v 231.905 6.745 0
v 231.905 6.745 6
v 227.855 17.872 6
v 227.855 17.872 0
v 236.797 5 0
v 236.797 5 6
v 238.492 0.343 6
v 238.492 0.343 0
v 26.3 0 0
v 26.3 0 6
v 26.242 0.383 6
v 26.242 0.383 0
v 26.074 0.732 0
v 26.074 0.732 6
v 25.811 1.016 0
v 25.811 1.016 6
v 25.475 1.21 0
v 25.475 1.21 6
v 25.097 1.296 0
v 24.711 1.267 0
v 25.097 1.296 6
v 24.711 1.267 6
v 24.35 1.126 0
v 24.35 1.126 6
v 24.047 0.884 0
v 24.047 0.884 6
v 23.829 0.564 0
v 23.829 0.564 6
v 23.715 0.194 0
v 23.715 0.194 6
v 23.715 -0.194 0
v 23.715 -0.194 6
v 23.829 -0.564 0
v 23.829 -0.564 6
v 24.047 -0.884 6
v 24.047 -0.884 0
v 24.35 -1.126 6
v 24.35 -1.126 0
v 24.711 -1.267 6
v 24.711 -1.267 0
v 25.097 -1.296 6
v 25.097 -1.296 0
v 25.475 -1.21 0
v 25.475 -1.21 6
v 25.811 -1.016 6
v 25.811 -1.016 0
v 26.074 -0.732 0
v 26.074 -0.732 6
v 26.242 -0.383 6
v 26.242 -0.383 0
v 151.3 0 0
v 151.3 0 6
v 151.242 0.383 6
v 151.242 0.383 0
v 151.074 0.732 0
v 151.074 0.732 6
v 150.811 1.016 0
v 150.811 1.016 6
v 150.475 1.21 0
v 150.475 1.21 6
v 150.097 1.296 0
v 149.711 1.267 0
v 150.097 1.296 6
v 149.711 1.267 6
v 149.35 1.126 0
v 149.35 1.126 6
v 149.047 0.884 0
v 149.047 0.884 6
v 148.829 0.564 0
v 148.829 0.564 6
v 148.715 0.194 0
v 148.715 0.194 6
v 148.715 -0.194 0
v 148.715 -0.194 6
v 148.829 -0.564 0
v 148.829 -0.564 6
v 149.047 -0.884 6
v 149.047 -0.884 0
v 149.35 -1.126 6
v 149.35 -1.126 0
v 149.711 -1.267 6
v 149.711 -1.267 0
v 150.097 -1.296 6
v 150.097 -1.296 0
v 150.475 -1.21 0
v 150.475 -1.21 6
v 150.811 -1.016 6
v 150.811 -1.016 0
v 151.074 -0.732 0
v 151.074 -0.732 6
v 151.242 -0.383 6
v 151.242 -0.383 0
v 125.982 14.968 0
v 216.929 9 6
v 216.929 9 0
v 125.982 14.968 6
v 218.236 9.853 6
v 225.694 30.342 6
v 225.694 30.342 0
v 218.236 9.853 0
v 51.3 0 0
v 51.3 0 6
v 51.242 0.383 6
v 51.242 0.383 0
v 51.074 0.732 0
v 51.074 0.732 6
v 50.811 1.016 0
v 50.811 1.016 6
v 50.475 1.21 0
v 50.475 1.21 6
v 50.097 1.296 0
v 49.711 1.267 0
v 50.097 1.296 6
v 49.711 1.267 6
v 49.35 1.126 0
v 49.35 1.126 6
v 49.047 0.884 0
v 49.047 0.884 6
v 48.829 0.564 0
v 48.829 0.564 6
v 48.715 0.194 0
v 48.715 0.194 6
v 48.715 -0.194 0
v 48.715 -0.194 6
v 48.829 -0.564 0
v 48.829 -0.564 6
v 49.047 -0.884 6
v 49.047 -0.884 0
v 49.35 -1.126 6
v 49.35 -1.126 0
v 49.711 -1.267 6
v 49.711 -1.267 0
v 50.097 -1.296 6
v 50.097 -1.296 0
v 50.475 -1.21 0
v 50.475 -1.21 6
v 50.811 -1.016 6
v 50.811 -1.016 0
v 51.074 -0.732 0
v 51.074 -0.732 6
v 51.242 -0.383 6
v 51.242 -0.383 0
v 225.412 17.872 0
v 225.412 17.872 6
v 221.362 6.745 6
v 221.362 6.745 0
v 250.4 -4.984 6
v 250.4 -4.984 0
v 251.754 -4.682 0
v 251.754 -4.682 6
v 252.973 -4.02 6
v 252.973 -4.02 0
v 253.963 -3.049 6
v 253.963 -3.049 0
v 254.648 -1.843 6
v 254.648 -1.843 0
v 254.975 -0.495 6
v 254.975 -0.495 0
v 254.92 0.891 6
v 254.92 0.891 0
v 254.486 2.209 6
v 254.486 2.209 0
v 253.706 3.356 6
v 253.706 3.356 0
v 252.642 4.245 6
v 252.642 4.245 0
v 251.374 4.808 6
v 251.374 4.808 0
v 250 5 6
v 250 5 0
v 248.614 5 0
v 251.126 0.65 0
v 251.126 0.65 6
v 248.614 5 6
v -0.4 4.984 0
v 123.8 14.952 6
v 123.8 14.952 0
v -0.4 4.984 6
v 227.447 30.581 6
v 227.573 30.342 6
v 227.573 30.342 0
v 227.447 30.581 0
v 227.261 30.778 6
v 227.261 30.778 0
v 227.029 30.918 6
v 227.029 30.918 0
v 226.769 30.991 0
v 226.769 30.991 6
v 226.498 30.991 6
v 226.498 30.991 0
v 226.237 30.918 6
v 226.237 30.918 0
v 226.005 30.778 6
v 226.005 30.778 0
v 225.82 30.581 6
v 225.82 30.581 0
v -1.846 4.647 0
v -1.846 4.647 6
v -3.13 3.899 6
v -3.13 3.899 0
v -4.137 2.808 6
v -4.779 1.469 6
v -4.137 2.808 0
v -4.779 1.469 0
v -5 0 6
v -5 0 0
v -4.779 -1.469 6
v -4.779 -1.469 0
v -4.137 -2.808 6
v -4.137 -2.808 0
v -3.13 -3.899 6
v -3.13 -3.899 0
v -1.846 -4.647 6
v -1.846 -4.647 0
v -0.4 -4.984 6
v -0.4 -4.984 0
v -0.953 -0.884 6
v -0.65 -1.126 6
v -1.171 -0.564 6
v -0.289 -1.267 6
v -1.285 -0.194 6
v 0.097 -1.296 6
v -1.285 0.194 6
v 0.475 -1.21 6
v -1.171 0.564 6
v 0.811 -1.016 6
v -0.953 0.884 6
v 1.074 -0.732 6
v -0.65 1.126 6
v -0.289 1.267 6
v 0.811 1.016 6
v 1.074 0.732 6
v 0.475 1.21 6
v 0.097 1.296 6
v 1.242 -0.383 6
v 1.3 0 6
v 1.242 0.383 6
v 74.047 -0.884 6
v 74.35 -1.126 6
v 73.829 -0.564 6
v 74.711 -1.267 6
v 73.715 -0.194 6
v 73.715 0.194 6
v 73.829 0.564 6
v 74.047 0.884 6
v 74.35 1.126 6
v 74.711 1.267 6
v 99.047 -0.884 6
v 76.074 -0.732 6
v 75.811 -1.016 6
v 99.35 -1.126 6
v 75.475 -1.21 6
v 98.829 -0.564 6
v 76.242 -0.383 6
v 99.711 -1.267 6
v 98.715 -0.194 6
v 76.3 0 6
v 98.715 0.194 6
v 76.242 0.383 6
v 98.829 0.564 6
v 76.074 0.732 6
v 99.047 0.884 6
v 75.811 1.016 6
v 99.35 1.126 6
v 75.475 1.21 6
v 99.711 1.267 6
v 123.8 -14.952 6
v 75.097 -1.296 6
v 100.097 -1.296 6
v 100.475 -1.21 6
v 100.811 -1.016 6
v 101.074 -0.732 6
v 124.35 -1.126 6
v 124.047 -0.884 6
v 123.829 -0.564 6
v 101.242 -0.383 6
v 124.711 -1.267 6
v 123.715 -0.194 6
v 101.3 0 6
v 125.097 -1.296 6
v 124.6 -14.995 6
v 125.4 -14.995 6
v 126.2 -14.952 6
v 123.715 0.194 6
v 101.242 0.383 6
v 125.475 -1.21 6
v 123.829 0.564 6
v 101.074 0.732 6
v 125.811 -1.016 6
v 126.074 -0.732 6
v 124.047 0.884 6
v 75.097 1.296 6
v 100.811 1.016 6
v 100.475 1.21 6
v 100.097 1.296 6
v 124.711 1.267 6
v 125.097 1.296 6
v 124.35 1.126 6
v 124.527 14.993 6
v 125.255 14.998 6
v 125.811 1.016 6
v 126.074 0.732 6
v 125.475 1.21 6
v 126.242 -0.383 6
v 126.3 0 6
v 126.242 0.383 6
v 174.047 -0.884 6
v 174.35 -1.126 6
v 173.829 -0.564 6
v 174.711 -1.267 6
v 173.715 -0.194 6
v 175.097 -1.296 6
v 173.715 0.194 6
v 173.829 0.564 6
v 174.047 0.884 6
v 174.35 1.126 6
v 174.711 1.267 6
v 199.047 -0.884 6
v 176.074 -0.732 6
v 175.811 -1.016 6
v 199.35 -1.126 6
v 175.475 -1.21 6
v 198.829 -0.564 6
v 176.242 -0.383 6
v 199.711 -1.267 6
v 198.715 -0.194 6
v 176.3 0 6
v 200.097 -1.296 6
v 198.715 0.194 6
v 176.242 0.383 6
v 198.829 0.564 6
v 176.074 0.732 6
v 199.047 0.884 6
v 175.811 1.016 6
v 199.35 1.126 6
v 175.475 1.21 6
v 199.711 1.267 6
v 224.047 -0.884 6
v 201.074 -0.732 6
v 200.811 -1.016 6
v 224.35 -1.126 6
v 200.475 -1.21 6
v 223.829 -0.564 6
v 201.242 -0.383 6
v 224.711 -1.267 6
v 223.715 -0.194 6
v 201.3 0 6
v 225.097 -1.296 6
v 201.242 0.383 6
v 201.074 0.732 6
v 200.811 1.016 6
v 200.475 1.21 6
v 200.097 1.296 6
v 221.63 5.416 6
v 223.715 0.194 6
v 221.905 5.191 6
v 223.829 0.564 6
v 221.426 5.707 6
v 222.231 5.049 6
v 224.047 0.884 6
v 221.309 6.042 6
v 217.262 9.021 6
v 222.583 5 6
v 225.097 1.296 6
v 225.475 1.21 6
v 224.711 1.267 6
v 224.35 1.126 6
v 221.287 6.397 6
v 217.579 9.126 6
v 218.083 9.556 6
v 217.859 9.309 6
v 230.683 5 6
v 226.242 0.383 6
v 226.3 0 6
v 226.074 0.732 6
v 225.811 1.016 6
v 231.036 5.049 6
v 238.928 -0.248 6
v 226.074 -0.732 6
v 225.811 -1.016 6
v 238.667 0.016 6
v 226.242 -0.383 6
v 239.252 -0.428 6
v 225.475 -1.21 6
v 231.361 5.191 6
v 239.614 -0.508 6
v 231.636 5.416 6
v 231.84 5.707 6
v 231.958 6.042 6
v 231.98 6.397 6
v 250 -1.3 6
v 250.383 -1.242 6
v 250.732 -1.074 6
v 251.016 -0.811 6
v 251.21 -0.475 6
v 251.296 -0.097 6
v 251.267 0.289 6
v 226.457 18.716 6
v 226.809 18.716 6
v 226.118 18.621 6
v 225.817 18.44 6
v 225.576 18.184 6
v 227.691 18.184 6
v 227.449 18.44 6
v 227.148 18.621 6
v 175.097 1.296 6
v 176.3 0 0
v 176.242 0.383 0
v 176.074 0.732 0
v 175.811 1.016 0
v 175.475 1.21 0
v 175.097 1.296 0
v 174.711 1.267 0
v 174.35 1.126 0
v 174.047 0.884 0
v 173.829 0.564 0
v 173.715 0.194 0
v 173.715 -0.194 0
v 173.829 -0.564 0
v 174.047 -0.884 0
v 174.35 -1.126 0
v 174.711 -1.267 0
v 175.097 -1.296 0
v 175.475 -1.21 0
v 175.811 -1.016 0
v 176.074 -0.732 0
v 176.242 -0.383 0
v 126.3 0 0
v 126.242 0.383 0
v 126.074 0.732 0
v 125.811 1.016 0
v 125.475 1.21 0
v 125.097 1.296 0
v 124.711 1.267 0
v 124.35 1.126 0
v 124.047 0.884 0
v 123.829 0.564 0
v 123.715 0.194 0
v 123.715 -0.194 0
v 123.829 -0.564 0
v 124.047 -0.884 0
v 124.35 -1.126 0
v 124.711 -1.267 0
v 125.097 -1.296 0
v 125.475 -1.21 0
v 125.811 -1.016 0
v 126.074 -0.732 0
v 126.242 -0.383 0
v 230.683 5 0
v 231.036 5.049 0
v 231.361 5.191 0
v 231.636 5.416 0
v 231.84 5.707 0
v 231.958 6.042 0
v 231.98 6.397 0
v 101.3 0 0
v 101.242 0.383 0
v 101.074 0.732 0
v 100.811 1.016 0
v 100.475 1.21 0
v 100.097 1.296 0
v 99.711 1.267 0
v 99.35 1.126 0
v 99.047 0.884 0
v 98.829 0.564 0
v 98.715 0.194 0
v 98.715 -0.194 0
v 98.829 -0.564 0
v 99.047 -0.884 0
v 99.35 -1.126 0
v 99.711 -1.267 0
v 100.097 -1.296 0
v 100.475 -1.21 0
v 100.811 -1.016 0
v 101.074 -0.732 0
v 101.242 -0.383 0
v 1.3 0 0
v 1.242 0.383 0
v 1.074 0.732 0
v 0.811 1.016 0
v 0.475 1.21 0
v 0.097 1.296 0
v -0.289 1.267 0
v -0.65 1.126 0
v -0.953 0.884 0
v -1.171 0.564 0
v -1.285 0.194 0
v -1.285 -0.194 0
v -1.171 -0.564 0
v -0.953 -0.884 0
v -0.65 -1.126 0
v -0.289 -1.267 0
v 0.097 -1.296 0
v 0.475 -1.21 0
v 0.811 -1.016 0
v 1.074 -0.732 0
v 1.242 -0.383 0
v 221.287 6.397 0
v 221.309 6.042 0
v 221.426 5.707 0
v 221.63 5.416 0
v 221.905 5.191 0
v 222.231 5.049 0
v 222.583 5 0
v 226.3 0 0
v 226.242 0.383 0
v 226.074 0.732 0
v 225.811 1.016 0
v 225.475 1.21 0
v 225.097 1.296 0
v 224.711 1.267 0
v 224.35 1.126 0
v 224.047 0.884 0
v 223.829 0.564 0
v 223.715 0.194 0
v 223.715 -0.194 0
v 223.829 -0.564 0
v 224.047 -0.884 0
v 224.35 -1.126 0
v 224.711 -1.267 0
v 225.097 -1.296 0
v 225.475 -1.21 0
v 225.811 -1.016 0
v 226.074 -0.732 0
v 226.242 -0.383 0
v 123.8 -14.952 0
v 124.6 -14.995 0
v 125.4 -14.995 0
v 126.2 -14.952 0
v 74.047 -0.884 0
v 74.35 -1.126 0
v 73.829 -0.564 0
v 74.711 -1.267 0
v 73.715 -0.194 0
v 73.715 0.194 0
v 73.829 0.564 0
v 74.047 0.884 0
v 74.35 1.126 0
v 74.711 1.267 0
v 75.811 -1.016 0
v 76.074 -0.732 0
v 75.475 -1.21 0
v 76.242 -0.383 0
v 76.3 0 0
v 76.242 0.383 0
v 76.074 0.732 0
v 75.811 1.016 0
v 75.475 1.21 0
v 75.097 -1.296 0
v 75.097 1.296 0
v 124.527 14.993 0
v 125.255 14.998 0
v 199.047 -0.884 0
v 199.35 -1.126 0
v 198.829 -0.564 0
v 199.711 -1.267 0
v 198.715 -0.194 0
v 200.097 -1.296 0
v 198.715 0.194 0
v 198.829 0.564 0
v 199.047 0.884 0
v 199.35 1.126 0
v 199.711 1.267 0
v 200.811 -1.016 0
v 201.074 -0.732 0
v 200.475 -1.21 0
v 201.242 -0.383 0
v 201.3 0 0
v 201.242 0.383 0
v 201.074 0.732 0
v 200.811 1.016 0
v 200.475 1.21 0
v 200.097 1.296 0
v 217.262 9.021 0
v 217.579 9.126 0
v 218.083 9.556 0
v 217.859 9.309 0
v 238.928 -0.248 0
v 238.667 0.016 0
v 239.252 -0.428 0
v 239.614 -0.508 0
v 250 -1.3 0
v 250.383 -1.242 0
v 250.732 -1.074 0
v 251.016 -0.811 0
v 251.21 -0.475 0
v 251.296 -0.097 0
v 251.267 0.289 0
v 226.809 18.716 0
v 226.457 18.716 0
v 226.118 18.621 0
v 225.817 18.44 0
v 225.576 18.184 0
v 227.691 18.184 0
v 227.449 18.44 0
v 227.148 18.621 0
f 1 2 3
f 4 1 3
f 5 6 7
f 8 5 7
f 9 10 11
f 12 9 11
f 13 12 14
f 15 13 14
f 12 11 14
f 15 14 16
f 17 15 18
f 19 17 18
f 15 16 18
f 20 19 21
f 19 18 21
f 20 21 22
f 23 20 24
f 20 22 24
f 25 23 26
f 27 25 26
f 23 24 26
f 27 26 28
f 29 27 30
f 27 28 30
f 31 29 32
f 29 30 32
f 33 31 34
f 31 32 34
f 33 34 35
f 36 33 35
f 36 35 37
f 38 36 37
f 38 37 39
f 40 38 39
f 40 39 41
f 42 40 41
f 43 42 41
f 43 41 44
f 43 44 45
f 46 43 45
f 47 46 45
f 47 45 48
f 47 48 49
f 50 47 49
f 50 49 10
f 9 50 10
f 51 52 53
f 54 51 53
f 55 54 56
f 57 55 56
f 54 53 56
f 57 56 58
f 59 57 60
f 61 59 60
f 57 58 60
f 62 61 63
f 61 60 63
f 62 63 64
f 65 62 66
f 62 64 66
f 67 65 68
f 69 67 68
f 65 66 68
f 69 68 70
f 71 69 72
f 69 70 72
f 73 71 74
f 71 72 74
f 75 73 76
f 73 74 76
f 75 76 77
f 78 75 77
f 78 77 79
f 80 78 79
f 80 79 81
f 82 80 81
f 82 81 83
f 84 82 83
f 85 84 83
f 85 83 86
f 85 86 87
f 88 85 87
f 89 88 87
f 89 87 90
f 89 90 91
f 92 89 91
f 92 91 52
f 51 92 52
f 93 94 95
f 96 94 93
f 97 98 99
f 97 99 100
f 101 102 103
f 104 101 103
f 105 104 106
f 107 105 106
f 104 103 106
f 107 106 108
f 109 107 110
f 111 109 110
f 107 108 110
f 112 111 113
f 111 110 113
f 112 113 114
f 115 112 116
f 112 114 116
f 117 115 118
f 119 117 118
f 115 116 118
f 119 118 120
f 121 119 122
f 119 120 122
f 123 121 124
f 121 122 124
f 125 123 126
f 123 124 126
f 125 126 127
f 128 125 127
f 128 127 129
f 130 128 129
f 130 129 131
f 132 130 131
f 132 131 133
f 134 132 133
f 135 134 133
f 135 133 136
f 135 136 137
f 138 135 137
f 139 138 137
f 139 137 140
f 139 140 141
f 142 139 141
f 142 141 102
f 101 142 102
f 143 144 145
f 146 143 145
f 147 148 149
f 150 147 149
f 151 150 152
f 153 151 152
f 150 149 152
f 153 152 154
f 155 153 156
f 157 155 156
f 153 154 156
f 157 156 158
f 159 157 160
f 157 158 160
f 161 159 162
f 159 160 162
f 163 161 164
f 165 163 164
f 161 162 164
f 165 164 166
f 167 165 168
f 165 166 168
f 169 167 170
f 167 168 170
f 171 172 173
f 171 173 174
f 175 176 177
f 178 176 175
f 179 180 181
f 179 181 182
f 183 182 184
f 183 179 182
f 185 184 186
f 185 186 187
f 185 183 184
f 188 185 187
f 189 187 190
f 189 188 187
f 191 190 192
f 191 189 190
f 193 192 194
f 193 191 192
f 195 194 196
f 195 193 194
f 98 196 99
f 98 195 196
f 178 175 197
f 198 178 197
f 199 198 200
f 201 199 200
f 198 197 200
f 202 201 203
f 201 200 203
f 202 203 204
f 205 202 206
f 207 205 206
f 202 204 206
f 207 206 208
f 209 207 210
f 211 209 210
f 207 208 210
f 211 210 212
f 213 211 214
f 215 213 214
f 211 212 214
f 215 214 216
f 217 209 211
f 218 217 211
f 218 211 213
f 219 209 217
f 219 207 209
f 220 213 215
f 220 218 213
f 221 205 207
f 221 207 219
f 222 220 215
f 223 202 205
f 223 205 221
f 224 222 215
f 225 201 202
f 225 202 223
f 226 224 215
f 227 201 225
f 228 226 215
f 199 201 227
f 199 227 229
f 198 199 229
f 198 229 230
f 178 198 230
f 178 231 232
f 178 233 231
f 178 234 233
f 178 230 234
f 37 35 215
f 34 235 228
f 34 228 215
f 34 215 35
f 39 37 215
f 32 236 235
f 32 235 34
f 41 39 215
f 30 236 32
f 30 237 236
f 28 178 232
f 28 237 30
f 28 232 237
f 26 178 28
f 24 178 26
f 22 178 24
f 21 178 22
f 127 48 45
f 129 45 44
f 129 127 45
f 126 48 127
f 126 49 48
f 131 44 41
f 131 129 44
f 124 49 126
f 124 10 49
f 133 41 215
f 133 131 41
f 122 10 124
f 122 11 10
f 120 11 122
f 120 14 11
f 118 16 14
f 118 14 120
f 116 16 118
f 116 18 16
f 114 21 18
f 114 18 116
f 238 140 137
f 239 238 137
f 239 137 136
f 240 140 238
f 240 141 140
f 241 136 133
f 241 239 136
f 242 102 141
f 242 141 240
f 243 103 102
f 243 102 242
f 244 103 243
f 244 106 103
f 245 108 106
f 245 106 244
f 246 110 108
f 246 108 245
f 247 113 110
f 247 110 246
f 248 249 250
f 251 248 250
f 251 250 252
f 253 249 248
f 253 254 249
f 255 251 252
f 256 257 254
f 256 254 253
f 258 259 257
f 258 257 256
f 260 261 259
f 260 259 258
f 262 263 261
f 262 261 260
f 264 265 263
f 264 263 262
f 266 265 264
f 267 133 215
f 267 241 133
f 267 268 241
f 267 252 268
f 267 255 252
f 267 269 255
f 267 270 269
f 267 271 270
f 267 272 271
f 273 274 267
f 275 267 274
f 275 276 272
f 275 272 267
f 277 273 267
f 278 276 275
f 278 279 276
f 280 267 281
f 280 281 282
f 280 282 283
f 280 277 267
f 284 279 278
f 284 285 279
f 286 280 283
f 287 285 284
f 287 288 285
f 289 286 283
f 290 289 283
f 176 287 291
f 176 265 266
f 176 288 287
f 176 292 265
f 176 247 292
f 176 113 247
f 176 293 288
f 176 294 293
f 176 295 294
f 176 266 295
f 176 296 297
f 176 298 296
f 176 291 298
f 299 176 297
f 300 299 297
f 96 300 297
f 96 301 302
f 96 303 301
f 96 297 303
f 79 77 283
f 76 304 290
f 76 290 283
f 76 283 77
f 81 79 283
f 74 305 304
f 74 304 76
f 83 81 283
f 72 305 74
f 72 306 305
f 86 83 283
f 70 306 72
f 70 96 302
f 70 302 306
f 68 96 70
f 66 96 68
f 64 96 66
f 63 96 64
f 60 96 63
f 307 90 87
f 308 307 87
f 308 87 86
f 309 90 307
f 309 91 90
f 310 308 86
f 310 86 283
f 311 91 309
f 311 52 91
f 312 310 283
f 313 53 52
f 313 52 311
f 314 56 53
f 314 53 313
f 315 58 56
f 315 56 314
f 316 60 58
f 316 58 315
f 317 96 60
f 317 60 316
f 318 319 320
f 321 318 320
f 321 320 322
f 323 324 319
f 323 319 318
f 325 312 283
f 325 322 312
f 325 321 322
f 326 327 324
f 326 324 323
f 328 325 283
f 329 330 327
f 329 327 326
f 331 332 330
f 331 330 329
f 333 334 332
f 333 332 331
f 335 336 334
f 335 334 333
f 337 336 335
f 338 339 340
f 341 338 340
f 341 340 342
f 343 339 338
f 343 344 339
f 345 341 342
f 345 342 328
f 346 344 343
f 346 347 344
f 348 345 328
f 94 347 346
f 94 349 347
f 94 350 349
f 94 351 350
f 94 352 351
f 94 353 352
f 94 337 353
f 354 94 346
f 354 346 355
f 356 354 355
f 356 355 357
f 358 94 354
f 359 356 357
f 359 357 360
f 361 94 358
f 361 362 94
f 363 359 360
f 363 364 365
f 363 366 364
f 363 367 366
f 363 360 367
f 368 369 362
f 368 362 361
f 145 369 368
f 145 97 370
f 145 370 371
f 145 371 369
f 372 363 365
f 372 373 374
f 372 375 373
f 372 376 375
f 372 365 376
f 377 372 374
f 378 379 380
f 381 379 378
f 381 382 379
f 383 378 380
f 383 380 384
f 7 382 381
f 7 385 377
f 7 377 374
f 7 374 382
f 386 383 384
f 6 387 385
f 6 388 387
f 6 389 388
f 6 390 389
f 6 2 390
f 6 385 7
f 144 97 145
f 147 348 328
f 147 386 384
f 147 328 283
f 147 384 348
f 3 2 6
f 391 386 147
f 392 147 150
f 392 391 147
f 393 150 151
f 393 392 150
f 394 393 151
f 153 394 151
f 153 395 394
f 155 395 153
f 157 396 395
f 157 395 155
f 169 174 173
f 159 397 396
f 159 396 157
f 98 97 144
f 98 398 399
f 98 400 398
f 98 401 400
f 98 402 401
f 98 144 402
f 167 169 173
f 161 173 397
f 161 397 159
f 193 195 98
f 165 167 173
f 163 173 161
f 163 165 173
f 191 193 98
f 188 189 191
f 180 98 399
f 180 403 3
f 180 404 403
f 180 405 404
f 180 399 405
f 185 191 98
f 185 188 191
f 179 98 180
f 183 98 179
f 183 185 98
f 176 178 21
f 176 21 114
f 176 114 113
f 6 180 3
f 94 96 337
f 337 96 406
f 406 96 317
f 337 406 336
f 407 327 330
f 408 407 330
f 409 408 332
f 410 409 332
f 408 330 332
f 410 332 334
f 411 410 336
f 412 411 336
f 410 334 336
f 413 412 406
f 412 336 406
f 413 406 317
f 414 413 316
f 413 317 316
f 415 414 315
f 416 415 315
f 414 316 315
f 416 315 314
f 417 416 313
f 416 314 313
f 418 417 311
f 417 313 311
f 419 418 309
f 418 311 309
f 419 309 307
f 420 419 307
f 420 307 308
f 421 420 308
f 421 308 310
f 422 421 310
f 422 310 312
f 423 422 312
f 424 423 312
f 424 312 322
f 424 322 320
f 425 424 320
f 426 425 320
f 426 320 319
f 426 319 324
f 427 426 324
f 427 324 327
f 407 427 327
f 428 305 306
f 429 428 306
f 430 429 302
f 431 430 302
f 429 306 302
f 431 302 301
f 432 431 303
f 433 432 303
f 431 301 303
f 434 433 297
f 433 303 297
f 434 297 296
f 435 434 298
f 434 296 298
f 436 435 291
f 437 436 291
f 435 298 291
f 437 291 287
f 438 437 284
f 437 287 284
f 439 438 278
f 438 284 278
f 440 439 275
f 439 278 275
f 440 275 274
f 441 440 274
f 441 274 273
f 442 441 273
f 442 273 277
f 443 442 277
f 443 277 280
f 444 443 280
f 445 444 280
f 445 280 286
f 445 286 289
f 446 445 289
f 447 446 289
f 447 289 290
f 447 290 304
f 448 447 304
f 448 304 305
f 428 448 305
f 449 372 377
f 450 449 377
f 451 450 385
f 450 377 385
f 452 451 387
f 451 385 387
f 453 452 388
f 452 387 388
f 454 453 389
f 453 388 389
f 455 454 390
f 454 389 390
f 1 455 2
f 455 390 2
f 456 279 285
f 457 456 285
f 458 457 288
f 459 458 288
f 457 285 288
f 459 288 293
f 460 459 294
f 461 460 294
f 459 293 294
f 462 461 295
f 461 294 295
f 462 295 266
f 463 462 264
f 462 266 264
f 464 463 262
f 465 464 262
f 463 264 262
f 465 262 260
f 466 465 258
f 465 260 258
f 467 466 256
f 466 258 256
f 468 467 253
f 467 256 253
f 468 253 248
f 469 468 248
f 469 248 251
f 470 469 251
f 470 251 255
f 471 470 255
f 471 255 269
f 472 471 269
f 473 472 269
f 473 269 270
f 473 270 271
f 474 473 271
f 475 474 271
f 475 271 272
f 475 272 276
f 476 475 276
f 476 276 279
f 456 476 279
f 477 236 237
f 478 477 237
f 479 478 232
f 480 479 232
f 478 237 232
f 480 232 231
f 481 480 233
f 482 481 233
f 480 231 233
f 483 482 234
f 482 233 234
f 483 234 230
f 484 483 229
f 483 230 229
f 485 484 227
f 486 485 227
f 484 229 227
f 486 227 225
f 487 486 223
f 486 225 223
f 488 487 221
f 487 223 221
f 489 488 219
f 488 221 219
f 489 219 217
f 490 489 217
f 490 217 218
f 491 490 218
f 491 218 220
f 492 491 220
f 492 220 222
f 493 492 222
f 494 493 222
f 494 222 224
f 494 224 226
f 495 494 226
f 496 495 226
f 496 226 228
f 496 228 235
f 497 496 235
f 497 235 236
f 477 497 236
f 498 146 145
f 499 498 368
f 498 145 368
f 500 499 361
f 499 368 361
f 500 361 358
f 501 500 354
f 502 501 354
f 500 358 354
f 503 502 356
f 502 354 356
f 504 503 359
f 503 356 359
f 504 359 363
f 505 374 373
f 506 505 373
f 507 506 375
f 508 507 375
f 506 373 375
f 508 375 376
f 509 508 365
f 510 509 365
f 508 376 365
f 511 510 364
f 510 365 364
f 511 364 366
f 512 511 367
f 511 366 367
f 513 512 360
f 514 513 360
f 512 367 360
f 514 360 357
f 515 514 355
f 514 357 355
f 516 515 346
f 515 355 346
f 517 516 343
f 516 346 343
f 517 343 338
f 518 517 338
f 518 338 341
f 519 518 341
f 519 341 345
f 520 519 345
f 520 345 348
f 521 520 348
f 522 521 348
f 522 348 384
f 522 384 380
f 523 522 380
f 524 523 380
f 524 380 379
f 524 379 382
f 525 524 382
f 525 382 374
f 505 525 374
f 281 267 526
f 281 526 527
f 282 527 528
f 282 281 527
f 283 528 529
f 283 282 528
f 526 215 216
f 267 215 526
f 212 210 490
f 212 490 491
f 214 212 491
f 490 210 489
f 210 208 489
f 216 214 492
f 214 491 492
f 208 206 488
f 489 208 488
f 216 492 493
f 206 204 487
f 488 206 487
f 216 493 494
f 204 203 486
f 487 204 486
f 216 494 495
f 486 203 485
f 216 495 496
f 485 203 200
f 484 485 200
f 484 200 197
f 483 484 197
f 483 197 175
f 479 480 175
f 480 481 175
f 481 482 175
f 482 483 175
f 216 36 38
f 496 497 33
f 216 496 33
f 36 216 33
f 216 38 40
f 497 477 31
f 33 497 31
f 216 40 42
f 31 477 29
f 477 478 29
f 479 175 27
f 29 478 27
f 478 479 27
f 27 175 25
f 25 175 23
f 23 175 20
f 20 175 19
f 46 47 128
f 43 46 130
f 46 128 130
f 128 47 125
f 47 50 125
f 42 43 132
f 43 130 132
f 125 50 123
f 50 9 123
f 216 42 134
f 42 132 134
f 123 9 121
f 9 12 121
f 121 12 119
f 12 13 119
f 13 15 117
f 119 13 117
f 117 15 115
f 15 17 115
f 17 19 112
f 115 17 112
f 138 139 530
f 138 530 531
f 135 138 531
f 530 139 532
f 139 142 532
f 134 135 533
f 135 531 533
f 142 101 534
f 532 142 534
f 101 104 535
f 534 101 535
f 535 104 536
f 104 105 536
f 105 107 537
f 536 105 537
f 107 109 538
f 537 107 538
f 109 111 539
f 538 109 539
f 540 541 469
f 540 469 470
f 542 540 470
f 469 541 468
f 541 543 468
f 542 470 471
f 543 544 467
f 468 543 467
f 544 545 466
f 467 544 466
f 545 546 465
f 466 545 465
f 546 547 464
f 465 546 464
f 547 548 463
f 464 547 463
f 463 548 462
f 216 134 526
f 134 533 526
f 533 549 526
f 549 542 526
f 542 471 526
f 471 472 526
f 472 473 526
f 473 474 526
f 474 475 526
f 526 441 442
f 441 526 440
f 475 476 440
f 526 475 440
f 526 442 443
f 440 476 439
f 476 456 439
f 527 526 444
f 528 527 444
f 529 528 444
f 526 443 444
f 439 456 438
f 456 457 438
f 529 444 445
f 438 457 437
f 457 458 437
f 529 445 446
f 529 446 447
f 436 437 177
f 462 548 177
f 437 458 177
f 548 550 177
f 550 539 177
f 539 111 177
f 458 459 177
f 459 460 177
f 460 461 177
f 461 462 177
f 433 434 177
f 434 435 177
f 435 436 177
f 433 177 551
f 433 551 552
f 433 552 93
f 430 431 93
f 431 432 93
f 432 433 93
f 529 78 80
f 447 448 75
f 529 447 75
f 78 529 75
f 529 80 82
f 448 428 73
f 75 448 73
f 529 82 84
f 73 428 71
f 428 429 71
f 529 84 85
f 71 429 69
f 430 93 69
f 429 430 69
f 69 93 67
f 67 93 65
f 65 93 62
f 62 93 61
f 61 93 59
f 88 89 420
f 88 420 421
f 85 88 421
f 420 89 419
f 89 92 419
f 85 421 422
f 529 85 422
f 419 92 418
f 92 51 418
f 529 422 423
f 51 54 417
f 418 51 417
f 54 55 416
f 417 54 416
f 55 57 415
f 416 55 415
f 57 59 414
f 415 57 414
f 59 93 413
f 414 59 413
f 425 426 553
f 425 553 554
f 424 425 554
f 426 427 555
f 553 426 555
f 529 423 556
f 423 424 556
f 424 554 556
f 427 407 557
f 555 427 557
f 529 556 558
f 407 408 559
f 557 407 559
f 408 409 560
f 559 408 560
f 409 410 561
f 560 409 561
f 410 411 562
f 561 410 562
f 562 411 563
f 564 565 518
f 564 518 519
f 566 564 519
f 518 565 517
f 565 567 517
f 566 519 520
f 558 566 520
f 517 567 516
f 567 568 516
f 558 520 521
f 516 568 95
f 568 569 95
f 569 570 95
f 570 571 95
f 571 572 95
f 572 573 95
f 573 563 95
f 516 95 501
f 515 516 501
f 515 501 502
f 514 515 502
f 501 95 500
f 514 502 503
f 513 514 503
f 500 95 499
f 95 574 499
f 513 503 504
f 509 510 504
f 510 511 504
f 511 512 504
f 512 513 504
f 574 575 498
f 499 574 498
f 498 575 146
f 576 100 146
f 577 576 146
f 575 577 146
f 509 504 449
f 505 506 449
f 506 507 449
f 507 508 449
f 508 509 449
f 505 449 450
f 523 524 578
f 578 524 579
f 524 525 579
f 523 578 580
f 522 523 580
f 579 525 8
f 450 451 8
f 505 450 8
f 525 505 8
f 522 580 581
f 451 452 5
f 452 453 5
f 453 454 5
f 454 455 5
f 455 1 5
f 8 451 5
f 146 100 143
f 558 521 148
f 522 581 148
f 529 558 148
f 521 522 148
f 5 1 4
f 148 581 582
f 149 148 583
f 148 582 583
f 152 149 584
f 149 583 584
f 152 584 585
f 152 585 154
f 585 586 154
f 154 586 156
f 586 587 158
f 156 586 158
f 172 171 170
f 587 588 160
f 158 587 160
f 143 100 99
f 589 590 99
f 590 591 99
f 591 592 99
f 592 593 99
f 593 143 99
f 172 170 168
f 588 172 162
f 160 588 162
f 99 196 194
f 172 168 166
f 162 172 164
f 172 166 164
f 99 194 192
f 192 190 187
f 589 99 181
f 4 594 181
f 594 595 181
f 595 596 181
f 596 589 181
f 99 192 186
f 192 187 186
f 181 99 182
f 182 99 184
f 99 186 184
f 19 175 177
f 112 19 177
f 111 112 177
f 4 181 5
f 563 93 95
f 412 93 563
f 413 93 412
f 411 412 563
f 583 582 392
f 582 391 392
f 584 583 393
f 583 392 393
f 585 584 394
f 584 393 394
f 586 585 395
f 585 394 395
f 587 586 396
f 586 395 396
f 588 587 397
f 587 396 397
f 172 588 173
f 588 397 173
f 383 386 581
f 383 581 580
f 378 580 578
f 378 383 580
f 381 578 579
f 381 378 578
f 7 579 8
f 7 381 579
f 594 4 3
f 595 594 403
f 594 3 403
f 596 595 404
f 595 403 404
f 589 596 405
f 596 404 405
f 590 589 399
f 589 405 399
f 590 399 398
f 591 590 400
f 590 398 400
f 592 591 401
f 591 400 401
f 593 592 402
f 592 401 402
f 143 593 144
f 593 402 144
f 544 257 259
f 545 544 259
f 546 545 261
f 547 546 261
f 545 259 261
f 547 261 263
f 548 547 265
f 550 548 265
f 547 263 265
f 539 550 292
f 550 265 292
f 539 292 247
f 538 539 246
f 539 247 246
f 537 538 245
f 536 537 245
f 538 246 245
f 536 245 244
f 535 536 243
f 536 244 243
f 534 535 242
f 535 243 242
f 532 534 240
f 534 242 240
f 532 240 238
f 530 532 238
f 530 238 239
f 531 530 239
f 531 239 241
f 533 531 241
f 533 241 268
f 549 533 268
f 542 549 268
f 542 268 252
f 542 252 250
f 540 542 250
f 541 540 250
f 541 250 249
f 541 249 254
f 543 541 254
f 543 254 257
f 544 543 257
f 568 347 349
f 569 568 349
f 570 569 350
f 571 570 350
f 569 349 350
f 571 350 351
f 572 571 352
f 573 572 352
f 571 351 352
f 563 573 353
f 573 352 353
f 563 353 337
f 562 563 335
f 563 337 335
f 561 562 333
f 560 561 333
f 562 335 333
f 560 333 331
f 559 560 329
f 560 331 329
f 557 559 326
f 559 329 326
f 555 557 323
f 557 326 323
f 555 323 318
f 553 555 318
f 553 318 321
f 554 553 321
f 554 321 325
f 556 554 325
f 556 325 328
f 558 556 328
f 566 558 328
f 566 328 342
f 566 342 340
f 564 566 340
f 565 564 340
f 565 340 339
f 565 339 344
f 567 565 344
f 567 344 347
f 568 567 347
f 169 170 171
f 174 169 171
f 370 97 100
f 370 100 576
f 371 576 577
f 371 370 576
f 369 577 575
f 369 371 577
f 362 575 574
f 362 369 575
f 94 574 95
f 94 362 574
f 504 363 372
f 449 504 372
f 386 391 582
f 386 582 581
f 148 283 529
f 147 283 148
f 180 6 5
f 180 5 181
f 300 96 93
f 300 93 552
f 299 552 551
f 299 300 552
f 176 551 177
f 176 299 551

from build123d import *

# Parameters (mm, degrees)
SKETCH1_R           = 5
BOSS_EXTRUDE1_DEPTH = 6
SKETCH2_R           = 1.3
CUT_EXTRUDE1_DEPTH  = 256.119579805
LPATTERN1_COUNT     = 10
LPATTERN1_PITCH     = 25
CUT_EXTRUDE3_DEPTH  = 256.119579805
BOSS_EXTRUDE2_DEPTH = 6
CUT_EXTRUDE4_DEPTH  = 257.947465448
BOSS_EXTRUDE3_DEPTH = 6


with BuildPart() as part:
    # Sketch1 → Boss-Extrude1 (new body)
    with BuildSketch(Plane.XY):
        with BuildLine():
            Line((250, 5), (0, 5))
            ThreePointArc((0, 5), (3.535533906, 3.535533906), (5, 0))
            ThreePointArc((5, 0), (3.535533906, -3.535533906), (0, -5))
            Line((0, -5), (250, -5))
            ThreePointArc((250, -5), (245, 0), (250, 5))
        make_face()
        with Locations((250, 0)):
            Circle(SKETCH1_R)
        Circle(SKETCH1_R)
    extrude(amount=BOSS_EXTRUDE1_DEPTH)

    # Sketch2 → Cut-Extrude1 (cut, through all)
    with BuildSketch(Plane.XY.offset(6)):
        Circle(SKETCH2_R)
        with Locations((250, 0)):
            Circle(SKETCH2_R)
    cut_extrude1 = extrude(amount=-CUT_EXTRUDE1_DEPTH, mode=Mode.SUBTRACT)

    # LPattern1: Cut-Extrude1 ×10
    with Locations(*[(i * LPATTERN1_PITCH, 0, 0) for i in range(1, LPATTERN1_COUNT)]):
        add(cut_extrude1, mode=Mode.SUBTRACT)

    # Sketch3 → Cut-Extrude3 (cut, through all)
    with BuildSketch(Plane.XY.offset(6)):
        with BuildLine():
            ThreePointArc((250, -1.3), (248.874166975, 0.65), (251.125833025, 0.65))
            Line((251.125833025, 0.65), (248.614359354, 5))
            Line((248.614359354, 5), (236.796717724, 5))
            Line((236.796717724, 5), (238.778399593, -0.444626186))
            ThreePointArc((238.778399593, -0.444626186), (239.254350633, -1.064897658), (240, -1.3))
            Line((240, -1.3), (250, -1.3))
        make_face()
    extrude(amount=-CUT_EXTRUDE3_DEPTH, mode=Mode.SUBTRACT)

    # Sketch3<4> → Boss-Extrude2 (add, through all)
    with BuildSketch(Plane.XY.offset(6)):
        with BuildLine():
            Line((216.469850466, 5), (236.796717724, 5))
            Line((236.796717724, 5), (227.572976716, 30.342020143))
            ThreePointArc((227.572976716, 30.342020143), (226.633284095, 31), (225.693591475, 30.342020143))
            Line((225.693591475, 30.342020143), (216.469850466, 5))
        make_face()
    extrude(amount=-BOSS_EXTRUDE2_DEPTH)

    # Sketch4 → Cut-Extrude4 (cut, through all)
    with BuildSketch(Plane.XY.offset(6)):
        with BuildLine():
            Line((225.411683688, 17.872267266), (221.361553558, 6.744626186))
            ThreePointArc((221.361553558, 6.744626186), (221.518256307, 5.554350633), (222.583153965, 5))
            Line((222.583153965, 5), (230.683414226, 5))
            ThreePointArc((230.683414226, 5), (231.748311883, 5.554350633), (231.905014633, 6.744626186))
            Line((231.905014633, 6.744626186), (227.854884502, 17.872267266))
            ThreePointArc((227.854884502, 17.872267266), (226.633284095, 18.727641079), (225.411683688, 17.872267266))
        make_face()
    extrude(amount=-CUT_EXTRUDE4_DEPTH, mode=Mode.SUBTRACT)

    # Sketch5 → Boss-Extrude3 (add, through all)
    with BuildSketch(Plane.XY.offset(6)):
        with BuildLine():
            ThreePointArc((110.857864376, 5), (115.8563971, 11.890943024), (123.8, 14.951922953))
            Line((123.8, 14.951922953), (-0.4, 4.983974318))
            ThreePointArc((-0.4, 4.983974318), (-0.20016045, 4.995991973), (0, 5))
            Line((0, 5), (110.857864376, 5))
        make_face()
        with BuildLine():
            ThreePointArc((0, -5), (-0.20016045, -4.995991973), (-0.4, -4.983974318))
            Line((-0.4, -4.983974318), (123.8, -14.951922953))
            ThreePointArc((123.8, -14.951922953), (115.8563971, -11.890943024), (110.857864376, -5))
            Line((110.857864376, -5), (0, -5))
        make_face()
        with BuildLine():
            ThreePointArc((125.982164337, 14.967810568), (124.890792866, 14.999602455), (123.8, 14.951922953))
            ThreePointArc((123.8, 14.951922953), (115.8563971, 11.890943024), (110.857864376, 5))
            Line((110.857864376, 5), (139.142135624, 5))
            ThreePointArc((139.142135624, 5), (134.056788847, 11.957197656), (125.982164337, 14.967810568))
        make_face()
        with BuildLine():
            Line((139.142135624, -5), (110.857864376, -5))
            ThreePointArc((110.857864376, -5), (115.8563971, -11.890943024), (123.8, -14.951922953))
            ThreePointArc((123.8, -14.951922953), (125, -15), (126.2, -14.951922953))
            ThreePointArc((126.2, -14.951922953), (134.1436029, -11.890943024), (139.142135624, -5))
        make_face()
        with BuildLine():
            Line((250, -5), (139.142135624, -5))
            ThreePointArc((139.142135624, -5), (134.1436029, -11.890943024), (126.2, -14.951922953))
            Line((126.2, -14.951922953), (250.4, -4.983974318))
            ThreePointArc((250.4, -4.983974318), (250.20016045, -4.995991973), (250, -5))
        make_face()
        with BuildLine():
            Line((216.929325308, 9), (125.982164337, 14.967810568))
            ThreePointArc((125.982164337, 14.967810568), (134.056788847, 11.957197656), (139.142135624, 5))
            Line((139.142135624, 5), (216.469850466, 5))
            Line((216.469850466, 5), (218.236046624, 9.852584063))
            ThreePointArc((218.236046624, 9.852584063), (217.724813241, 9.208459271), (216.929325308, 9))
        make_face()
        with BuildLine():
            Line((240, -1.3), (250, -1.3))
            Line((250, -1.3), (239.61442594, -0.50835284))
            ThreePointArc((239.61442594, -0.50835284), (238.927624535, -0.247883379), (238.491632246, 0.343260625))
            Line((238.491632246, 0.343260625), (238.778399593, -0.444626186))
            ThreePointArc((238.778399593, -0.444626186), (239.254350633, -1.064897658), (240, -1.3))
        make_face()
    extrude(amount=-BOSS_EXTRUDE3_DEPTH)


solid = part.part
